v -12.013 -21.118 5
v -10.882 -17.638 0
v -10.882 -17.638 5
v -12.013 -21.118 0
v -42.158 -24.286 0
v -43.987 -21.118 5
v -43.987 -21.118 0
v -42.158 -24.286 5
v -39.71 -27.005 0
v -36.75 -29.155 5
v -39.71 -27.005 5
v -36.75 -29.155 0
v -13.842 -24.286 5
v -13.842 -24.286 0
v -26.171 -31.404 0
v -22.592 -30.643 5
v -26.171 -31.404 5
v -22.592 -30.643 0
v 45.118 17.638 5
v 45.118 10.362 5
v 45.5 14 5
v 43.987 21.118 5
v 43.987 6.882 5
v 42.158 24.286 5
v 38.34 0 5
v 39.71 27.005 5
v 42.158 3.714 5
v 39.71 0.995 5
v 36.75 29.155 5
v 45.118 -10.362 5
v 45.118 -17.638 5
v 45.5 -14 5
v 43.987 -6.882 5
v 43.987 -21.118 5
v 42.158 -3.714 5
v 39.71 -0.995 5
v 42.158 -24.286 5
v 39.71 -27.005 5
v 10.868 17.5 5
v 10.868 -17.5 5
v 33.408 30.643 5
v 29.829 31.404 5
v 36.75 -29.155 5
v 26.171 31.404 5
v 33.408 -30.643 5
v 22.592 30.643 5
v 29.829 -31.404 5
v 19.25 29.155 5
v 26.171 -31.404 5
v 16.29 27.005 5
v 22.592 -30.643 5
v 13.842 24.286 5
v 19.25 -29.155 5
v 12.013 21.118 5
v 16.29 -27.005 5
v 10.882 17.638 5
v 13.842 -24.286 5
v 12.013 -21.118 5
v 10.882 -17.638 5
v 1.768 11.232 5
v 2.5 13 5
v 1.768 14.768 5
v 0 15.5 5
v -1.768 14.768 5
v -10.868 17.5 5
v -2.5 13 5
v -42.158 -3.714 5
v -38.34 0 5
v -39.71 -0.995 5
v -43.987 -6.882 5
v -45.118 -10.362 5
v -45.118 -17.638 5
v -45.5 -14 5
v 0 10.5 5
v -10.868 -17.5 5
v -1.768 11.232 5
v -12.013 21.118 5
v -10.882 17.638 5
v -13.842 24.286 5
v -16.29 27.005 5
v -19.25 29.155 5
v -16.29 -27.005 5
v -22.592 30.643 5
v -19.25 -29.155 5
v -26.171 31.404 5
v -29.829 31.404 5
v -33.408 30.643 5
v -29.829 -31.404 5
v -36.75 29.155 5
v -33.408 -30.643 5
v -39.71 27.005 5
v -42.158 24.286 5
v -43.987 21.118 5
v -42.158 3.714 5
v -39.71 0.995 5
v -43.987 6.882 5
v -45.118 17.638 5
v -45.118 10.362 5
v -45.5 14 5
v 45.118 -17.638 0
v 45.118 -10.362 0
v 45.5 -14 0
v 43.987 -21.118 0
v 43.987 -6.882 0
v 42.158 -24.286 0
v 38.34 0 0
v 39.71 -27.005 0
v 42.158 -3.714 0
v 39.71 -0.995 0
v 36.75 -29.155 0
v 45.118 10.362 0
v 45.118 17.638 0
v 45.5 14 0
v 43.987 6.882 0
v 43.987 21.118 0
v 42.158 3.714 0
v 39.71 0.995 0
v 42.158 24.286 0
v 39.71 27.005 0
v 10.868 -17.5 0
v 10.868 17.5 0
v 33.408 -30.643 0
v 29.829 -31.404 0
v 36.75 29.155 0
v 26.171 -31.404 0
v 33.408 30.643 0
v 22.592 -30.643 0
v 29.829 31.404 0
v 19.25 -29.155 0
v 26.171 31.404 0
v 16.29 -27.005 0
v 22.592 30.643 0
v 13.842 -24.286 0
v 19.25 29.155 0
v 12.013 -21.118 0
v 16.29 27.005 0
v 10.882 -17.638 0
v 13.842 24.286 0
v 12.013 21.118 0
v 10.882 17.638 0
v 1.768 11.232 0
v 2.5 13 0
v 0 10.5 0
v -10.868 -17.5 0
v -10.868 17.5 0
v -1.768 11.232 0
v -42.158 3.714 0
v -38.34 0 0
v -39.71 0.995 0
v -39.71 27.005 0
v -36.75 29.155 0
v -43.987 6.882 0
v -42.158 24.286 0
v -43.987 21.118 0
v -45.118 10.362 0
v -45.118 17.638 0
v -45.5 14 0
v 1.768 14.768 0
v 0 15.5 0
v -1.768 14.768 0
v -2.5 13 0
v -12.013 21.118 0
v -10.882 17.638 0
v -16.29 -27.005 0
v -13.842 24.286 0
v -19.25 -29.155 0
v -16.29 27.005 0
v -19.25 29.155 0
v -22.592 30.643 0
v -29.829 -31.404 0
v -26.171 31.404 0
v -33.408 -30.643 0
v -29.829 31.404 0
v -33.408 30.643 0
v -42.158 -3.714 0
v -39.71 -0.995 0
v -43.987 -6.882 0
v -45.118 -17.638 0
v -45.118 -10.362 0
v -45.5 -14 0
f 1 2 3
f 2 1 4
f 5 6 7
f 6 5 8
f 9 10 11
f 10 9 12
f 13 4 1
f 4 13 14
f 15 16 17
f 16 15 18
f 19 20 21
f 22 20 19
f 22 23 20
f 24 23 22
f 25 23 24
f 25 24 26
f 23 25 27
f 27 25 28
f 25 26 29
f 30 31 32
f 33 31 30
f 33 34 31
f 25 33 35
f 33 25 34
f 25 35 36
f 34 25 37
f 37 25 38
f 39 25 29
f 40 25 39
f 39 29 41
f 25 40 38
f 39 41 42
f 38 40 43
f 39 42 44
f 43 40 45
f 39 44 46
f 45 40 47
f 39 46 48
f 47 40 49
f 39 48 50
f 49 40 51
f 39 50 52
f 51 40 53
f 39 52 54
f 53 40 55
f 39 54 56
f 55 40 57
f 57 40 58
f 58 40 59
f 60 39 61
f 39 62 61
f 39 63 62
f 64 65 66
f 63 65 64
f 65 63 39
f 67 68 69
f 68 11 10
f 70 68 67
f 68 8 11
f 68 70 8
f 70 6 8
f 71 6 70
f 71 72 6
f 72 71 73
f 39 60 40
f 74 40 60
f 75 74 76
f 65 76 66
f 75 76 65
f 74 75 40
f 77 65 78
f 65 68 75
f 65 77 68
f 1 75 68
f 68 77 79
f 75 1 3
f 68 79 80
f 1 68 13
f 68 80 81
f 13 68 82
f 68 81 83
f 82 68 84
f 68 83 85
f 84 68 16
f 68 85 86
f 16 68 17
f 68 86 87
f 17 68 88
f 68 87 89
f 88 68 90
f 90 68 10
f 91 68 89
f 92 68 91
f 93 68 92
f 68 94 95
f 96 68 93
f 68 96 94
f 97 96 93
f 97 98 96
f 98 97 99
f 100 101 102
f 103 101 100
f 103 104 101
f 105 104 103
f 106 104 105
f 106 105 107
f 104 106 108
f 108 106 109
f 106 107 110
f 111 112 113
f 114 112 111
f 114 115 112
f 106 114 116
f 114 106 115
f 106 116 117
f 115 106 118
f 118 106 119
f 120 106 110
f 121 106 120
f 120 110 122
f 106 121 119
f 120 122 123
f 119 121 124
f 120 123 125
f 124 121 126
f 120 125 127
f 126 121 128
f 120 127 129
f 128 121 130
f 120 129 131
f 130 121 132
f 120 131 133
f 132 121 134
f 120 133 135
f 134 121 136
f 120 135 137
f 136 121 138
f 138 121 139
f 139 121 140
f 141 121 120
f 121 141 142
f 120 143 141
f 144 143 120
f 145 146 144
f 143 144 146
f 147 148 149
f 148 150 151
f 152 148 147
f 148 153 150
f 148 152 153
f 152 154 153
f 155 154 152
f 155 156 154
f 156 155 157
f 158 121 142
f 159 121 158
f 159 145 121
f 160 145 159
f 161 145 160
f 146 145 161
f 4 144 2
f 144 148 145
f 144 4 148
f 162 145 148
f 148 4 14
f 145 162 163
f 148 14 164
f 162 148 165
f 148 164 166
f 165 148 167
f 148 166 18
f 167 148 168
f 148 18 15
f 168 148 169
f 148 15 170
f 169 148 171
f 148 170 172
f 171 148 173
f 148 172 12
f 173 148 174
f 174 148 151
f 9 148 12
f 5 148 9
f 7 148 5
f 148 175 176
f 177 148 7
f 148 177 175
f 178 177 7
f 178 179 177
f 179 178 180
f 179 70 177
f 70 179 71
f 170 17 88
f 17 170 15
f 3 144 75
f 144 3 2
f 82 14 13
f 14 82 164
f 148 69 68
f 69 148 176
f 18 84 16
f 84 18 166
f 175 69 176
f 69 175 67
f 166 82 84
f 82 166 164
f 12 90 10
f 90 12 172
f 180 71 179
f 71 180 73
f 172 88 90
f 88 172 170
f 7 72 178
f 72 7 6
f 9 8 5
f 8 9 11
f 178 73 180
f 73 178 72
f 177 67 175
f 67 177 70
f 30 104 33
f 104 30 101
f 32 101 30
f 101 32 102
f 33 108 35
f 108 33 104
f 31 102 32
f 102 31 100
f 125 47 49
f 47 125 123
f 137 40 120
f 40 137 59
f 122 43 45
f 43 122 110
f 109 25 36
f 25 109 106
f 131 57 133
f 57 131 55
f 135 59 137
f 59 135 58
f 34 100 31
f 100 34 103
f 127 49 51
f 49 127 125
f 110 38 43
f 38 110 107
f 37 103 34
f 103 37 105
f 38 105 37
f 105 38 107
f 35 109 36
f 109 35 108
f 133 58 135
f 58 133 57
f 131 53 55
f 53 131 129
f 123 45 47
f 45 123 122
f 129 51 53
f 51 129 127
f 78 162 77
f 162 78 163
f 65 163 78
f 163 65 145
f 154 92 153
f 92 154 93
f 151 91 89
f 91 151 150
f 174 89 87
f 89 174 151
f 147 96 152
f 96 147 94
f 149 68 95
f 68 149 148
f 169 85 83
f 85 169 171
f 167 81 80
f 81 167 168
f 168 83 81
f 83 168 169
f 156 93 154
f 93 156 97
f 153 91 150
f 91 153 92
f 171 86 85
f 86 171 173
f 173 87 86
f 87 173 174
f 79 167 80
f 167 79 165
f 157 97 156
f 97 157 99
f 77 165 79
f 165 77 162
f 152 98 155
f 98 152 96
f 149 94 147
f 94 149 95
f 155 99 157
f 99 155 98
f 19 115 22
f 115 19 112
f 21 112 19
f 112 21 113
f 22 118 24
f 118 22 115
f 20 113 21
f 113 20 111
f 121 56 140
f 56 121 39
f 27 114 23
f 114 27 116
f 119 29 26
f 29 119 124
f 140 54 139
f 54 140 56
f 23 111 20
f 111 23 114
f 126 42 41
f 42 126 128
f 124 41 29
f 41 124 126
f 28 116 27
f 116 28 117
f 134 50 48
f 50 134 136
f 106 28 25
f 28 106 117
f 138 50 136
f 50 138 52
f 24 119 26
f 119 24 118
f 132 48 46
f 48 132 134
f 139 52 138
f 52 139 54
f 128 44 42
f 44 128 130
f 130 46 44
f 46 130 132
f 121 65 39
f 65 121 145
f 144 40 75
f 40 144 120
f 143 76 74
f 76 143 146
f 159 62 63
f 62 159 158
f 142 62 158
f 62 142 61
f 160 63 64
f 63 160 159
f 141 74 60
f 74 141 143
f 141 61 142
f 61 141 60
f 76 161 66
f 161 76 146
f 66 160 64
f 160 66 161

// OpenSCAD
use <Write.scad>

bone_dia = 35;
height = 5;

module bone() {
for (y = [-1, 1]) {
for (x = [-1, 1]) {
translate([x * bone_dia * 0.5 * 1.6, y * bone_dia * 0.4, 0])
cylinder(r=bone_dia/2, h=height);
}
}
translate([0, 0, height/2])
cube([1.5*bone_dia, bone_dia, height], center=true);
}

difference() {
	bone();

scale([1.5, 1.2, 1]) {
translate([0, 4, height/2-1])
write("SCOOBY",t=height+4, h=10, center=true, font="knewave.dxf");

translate([0, -6, height/2-1])
write("SNACK",t=height+4, h=10, center=true, font="knewave.dxf");
}

translate([0, 13, -1])
cylinder(r=2.5, h=10);

}
